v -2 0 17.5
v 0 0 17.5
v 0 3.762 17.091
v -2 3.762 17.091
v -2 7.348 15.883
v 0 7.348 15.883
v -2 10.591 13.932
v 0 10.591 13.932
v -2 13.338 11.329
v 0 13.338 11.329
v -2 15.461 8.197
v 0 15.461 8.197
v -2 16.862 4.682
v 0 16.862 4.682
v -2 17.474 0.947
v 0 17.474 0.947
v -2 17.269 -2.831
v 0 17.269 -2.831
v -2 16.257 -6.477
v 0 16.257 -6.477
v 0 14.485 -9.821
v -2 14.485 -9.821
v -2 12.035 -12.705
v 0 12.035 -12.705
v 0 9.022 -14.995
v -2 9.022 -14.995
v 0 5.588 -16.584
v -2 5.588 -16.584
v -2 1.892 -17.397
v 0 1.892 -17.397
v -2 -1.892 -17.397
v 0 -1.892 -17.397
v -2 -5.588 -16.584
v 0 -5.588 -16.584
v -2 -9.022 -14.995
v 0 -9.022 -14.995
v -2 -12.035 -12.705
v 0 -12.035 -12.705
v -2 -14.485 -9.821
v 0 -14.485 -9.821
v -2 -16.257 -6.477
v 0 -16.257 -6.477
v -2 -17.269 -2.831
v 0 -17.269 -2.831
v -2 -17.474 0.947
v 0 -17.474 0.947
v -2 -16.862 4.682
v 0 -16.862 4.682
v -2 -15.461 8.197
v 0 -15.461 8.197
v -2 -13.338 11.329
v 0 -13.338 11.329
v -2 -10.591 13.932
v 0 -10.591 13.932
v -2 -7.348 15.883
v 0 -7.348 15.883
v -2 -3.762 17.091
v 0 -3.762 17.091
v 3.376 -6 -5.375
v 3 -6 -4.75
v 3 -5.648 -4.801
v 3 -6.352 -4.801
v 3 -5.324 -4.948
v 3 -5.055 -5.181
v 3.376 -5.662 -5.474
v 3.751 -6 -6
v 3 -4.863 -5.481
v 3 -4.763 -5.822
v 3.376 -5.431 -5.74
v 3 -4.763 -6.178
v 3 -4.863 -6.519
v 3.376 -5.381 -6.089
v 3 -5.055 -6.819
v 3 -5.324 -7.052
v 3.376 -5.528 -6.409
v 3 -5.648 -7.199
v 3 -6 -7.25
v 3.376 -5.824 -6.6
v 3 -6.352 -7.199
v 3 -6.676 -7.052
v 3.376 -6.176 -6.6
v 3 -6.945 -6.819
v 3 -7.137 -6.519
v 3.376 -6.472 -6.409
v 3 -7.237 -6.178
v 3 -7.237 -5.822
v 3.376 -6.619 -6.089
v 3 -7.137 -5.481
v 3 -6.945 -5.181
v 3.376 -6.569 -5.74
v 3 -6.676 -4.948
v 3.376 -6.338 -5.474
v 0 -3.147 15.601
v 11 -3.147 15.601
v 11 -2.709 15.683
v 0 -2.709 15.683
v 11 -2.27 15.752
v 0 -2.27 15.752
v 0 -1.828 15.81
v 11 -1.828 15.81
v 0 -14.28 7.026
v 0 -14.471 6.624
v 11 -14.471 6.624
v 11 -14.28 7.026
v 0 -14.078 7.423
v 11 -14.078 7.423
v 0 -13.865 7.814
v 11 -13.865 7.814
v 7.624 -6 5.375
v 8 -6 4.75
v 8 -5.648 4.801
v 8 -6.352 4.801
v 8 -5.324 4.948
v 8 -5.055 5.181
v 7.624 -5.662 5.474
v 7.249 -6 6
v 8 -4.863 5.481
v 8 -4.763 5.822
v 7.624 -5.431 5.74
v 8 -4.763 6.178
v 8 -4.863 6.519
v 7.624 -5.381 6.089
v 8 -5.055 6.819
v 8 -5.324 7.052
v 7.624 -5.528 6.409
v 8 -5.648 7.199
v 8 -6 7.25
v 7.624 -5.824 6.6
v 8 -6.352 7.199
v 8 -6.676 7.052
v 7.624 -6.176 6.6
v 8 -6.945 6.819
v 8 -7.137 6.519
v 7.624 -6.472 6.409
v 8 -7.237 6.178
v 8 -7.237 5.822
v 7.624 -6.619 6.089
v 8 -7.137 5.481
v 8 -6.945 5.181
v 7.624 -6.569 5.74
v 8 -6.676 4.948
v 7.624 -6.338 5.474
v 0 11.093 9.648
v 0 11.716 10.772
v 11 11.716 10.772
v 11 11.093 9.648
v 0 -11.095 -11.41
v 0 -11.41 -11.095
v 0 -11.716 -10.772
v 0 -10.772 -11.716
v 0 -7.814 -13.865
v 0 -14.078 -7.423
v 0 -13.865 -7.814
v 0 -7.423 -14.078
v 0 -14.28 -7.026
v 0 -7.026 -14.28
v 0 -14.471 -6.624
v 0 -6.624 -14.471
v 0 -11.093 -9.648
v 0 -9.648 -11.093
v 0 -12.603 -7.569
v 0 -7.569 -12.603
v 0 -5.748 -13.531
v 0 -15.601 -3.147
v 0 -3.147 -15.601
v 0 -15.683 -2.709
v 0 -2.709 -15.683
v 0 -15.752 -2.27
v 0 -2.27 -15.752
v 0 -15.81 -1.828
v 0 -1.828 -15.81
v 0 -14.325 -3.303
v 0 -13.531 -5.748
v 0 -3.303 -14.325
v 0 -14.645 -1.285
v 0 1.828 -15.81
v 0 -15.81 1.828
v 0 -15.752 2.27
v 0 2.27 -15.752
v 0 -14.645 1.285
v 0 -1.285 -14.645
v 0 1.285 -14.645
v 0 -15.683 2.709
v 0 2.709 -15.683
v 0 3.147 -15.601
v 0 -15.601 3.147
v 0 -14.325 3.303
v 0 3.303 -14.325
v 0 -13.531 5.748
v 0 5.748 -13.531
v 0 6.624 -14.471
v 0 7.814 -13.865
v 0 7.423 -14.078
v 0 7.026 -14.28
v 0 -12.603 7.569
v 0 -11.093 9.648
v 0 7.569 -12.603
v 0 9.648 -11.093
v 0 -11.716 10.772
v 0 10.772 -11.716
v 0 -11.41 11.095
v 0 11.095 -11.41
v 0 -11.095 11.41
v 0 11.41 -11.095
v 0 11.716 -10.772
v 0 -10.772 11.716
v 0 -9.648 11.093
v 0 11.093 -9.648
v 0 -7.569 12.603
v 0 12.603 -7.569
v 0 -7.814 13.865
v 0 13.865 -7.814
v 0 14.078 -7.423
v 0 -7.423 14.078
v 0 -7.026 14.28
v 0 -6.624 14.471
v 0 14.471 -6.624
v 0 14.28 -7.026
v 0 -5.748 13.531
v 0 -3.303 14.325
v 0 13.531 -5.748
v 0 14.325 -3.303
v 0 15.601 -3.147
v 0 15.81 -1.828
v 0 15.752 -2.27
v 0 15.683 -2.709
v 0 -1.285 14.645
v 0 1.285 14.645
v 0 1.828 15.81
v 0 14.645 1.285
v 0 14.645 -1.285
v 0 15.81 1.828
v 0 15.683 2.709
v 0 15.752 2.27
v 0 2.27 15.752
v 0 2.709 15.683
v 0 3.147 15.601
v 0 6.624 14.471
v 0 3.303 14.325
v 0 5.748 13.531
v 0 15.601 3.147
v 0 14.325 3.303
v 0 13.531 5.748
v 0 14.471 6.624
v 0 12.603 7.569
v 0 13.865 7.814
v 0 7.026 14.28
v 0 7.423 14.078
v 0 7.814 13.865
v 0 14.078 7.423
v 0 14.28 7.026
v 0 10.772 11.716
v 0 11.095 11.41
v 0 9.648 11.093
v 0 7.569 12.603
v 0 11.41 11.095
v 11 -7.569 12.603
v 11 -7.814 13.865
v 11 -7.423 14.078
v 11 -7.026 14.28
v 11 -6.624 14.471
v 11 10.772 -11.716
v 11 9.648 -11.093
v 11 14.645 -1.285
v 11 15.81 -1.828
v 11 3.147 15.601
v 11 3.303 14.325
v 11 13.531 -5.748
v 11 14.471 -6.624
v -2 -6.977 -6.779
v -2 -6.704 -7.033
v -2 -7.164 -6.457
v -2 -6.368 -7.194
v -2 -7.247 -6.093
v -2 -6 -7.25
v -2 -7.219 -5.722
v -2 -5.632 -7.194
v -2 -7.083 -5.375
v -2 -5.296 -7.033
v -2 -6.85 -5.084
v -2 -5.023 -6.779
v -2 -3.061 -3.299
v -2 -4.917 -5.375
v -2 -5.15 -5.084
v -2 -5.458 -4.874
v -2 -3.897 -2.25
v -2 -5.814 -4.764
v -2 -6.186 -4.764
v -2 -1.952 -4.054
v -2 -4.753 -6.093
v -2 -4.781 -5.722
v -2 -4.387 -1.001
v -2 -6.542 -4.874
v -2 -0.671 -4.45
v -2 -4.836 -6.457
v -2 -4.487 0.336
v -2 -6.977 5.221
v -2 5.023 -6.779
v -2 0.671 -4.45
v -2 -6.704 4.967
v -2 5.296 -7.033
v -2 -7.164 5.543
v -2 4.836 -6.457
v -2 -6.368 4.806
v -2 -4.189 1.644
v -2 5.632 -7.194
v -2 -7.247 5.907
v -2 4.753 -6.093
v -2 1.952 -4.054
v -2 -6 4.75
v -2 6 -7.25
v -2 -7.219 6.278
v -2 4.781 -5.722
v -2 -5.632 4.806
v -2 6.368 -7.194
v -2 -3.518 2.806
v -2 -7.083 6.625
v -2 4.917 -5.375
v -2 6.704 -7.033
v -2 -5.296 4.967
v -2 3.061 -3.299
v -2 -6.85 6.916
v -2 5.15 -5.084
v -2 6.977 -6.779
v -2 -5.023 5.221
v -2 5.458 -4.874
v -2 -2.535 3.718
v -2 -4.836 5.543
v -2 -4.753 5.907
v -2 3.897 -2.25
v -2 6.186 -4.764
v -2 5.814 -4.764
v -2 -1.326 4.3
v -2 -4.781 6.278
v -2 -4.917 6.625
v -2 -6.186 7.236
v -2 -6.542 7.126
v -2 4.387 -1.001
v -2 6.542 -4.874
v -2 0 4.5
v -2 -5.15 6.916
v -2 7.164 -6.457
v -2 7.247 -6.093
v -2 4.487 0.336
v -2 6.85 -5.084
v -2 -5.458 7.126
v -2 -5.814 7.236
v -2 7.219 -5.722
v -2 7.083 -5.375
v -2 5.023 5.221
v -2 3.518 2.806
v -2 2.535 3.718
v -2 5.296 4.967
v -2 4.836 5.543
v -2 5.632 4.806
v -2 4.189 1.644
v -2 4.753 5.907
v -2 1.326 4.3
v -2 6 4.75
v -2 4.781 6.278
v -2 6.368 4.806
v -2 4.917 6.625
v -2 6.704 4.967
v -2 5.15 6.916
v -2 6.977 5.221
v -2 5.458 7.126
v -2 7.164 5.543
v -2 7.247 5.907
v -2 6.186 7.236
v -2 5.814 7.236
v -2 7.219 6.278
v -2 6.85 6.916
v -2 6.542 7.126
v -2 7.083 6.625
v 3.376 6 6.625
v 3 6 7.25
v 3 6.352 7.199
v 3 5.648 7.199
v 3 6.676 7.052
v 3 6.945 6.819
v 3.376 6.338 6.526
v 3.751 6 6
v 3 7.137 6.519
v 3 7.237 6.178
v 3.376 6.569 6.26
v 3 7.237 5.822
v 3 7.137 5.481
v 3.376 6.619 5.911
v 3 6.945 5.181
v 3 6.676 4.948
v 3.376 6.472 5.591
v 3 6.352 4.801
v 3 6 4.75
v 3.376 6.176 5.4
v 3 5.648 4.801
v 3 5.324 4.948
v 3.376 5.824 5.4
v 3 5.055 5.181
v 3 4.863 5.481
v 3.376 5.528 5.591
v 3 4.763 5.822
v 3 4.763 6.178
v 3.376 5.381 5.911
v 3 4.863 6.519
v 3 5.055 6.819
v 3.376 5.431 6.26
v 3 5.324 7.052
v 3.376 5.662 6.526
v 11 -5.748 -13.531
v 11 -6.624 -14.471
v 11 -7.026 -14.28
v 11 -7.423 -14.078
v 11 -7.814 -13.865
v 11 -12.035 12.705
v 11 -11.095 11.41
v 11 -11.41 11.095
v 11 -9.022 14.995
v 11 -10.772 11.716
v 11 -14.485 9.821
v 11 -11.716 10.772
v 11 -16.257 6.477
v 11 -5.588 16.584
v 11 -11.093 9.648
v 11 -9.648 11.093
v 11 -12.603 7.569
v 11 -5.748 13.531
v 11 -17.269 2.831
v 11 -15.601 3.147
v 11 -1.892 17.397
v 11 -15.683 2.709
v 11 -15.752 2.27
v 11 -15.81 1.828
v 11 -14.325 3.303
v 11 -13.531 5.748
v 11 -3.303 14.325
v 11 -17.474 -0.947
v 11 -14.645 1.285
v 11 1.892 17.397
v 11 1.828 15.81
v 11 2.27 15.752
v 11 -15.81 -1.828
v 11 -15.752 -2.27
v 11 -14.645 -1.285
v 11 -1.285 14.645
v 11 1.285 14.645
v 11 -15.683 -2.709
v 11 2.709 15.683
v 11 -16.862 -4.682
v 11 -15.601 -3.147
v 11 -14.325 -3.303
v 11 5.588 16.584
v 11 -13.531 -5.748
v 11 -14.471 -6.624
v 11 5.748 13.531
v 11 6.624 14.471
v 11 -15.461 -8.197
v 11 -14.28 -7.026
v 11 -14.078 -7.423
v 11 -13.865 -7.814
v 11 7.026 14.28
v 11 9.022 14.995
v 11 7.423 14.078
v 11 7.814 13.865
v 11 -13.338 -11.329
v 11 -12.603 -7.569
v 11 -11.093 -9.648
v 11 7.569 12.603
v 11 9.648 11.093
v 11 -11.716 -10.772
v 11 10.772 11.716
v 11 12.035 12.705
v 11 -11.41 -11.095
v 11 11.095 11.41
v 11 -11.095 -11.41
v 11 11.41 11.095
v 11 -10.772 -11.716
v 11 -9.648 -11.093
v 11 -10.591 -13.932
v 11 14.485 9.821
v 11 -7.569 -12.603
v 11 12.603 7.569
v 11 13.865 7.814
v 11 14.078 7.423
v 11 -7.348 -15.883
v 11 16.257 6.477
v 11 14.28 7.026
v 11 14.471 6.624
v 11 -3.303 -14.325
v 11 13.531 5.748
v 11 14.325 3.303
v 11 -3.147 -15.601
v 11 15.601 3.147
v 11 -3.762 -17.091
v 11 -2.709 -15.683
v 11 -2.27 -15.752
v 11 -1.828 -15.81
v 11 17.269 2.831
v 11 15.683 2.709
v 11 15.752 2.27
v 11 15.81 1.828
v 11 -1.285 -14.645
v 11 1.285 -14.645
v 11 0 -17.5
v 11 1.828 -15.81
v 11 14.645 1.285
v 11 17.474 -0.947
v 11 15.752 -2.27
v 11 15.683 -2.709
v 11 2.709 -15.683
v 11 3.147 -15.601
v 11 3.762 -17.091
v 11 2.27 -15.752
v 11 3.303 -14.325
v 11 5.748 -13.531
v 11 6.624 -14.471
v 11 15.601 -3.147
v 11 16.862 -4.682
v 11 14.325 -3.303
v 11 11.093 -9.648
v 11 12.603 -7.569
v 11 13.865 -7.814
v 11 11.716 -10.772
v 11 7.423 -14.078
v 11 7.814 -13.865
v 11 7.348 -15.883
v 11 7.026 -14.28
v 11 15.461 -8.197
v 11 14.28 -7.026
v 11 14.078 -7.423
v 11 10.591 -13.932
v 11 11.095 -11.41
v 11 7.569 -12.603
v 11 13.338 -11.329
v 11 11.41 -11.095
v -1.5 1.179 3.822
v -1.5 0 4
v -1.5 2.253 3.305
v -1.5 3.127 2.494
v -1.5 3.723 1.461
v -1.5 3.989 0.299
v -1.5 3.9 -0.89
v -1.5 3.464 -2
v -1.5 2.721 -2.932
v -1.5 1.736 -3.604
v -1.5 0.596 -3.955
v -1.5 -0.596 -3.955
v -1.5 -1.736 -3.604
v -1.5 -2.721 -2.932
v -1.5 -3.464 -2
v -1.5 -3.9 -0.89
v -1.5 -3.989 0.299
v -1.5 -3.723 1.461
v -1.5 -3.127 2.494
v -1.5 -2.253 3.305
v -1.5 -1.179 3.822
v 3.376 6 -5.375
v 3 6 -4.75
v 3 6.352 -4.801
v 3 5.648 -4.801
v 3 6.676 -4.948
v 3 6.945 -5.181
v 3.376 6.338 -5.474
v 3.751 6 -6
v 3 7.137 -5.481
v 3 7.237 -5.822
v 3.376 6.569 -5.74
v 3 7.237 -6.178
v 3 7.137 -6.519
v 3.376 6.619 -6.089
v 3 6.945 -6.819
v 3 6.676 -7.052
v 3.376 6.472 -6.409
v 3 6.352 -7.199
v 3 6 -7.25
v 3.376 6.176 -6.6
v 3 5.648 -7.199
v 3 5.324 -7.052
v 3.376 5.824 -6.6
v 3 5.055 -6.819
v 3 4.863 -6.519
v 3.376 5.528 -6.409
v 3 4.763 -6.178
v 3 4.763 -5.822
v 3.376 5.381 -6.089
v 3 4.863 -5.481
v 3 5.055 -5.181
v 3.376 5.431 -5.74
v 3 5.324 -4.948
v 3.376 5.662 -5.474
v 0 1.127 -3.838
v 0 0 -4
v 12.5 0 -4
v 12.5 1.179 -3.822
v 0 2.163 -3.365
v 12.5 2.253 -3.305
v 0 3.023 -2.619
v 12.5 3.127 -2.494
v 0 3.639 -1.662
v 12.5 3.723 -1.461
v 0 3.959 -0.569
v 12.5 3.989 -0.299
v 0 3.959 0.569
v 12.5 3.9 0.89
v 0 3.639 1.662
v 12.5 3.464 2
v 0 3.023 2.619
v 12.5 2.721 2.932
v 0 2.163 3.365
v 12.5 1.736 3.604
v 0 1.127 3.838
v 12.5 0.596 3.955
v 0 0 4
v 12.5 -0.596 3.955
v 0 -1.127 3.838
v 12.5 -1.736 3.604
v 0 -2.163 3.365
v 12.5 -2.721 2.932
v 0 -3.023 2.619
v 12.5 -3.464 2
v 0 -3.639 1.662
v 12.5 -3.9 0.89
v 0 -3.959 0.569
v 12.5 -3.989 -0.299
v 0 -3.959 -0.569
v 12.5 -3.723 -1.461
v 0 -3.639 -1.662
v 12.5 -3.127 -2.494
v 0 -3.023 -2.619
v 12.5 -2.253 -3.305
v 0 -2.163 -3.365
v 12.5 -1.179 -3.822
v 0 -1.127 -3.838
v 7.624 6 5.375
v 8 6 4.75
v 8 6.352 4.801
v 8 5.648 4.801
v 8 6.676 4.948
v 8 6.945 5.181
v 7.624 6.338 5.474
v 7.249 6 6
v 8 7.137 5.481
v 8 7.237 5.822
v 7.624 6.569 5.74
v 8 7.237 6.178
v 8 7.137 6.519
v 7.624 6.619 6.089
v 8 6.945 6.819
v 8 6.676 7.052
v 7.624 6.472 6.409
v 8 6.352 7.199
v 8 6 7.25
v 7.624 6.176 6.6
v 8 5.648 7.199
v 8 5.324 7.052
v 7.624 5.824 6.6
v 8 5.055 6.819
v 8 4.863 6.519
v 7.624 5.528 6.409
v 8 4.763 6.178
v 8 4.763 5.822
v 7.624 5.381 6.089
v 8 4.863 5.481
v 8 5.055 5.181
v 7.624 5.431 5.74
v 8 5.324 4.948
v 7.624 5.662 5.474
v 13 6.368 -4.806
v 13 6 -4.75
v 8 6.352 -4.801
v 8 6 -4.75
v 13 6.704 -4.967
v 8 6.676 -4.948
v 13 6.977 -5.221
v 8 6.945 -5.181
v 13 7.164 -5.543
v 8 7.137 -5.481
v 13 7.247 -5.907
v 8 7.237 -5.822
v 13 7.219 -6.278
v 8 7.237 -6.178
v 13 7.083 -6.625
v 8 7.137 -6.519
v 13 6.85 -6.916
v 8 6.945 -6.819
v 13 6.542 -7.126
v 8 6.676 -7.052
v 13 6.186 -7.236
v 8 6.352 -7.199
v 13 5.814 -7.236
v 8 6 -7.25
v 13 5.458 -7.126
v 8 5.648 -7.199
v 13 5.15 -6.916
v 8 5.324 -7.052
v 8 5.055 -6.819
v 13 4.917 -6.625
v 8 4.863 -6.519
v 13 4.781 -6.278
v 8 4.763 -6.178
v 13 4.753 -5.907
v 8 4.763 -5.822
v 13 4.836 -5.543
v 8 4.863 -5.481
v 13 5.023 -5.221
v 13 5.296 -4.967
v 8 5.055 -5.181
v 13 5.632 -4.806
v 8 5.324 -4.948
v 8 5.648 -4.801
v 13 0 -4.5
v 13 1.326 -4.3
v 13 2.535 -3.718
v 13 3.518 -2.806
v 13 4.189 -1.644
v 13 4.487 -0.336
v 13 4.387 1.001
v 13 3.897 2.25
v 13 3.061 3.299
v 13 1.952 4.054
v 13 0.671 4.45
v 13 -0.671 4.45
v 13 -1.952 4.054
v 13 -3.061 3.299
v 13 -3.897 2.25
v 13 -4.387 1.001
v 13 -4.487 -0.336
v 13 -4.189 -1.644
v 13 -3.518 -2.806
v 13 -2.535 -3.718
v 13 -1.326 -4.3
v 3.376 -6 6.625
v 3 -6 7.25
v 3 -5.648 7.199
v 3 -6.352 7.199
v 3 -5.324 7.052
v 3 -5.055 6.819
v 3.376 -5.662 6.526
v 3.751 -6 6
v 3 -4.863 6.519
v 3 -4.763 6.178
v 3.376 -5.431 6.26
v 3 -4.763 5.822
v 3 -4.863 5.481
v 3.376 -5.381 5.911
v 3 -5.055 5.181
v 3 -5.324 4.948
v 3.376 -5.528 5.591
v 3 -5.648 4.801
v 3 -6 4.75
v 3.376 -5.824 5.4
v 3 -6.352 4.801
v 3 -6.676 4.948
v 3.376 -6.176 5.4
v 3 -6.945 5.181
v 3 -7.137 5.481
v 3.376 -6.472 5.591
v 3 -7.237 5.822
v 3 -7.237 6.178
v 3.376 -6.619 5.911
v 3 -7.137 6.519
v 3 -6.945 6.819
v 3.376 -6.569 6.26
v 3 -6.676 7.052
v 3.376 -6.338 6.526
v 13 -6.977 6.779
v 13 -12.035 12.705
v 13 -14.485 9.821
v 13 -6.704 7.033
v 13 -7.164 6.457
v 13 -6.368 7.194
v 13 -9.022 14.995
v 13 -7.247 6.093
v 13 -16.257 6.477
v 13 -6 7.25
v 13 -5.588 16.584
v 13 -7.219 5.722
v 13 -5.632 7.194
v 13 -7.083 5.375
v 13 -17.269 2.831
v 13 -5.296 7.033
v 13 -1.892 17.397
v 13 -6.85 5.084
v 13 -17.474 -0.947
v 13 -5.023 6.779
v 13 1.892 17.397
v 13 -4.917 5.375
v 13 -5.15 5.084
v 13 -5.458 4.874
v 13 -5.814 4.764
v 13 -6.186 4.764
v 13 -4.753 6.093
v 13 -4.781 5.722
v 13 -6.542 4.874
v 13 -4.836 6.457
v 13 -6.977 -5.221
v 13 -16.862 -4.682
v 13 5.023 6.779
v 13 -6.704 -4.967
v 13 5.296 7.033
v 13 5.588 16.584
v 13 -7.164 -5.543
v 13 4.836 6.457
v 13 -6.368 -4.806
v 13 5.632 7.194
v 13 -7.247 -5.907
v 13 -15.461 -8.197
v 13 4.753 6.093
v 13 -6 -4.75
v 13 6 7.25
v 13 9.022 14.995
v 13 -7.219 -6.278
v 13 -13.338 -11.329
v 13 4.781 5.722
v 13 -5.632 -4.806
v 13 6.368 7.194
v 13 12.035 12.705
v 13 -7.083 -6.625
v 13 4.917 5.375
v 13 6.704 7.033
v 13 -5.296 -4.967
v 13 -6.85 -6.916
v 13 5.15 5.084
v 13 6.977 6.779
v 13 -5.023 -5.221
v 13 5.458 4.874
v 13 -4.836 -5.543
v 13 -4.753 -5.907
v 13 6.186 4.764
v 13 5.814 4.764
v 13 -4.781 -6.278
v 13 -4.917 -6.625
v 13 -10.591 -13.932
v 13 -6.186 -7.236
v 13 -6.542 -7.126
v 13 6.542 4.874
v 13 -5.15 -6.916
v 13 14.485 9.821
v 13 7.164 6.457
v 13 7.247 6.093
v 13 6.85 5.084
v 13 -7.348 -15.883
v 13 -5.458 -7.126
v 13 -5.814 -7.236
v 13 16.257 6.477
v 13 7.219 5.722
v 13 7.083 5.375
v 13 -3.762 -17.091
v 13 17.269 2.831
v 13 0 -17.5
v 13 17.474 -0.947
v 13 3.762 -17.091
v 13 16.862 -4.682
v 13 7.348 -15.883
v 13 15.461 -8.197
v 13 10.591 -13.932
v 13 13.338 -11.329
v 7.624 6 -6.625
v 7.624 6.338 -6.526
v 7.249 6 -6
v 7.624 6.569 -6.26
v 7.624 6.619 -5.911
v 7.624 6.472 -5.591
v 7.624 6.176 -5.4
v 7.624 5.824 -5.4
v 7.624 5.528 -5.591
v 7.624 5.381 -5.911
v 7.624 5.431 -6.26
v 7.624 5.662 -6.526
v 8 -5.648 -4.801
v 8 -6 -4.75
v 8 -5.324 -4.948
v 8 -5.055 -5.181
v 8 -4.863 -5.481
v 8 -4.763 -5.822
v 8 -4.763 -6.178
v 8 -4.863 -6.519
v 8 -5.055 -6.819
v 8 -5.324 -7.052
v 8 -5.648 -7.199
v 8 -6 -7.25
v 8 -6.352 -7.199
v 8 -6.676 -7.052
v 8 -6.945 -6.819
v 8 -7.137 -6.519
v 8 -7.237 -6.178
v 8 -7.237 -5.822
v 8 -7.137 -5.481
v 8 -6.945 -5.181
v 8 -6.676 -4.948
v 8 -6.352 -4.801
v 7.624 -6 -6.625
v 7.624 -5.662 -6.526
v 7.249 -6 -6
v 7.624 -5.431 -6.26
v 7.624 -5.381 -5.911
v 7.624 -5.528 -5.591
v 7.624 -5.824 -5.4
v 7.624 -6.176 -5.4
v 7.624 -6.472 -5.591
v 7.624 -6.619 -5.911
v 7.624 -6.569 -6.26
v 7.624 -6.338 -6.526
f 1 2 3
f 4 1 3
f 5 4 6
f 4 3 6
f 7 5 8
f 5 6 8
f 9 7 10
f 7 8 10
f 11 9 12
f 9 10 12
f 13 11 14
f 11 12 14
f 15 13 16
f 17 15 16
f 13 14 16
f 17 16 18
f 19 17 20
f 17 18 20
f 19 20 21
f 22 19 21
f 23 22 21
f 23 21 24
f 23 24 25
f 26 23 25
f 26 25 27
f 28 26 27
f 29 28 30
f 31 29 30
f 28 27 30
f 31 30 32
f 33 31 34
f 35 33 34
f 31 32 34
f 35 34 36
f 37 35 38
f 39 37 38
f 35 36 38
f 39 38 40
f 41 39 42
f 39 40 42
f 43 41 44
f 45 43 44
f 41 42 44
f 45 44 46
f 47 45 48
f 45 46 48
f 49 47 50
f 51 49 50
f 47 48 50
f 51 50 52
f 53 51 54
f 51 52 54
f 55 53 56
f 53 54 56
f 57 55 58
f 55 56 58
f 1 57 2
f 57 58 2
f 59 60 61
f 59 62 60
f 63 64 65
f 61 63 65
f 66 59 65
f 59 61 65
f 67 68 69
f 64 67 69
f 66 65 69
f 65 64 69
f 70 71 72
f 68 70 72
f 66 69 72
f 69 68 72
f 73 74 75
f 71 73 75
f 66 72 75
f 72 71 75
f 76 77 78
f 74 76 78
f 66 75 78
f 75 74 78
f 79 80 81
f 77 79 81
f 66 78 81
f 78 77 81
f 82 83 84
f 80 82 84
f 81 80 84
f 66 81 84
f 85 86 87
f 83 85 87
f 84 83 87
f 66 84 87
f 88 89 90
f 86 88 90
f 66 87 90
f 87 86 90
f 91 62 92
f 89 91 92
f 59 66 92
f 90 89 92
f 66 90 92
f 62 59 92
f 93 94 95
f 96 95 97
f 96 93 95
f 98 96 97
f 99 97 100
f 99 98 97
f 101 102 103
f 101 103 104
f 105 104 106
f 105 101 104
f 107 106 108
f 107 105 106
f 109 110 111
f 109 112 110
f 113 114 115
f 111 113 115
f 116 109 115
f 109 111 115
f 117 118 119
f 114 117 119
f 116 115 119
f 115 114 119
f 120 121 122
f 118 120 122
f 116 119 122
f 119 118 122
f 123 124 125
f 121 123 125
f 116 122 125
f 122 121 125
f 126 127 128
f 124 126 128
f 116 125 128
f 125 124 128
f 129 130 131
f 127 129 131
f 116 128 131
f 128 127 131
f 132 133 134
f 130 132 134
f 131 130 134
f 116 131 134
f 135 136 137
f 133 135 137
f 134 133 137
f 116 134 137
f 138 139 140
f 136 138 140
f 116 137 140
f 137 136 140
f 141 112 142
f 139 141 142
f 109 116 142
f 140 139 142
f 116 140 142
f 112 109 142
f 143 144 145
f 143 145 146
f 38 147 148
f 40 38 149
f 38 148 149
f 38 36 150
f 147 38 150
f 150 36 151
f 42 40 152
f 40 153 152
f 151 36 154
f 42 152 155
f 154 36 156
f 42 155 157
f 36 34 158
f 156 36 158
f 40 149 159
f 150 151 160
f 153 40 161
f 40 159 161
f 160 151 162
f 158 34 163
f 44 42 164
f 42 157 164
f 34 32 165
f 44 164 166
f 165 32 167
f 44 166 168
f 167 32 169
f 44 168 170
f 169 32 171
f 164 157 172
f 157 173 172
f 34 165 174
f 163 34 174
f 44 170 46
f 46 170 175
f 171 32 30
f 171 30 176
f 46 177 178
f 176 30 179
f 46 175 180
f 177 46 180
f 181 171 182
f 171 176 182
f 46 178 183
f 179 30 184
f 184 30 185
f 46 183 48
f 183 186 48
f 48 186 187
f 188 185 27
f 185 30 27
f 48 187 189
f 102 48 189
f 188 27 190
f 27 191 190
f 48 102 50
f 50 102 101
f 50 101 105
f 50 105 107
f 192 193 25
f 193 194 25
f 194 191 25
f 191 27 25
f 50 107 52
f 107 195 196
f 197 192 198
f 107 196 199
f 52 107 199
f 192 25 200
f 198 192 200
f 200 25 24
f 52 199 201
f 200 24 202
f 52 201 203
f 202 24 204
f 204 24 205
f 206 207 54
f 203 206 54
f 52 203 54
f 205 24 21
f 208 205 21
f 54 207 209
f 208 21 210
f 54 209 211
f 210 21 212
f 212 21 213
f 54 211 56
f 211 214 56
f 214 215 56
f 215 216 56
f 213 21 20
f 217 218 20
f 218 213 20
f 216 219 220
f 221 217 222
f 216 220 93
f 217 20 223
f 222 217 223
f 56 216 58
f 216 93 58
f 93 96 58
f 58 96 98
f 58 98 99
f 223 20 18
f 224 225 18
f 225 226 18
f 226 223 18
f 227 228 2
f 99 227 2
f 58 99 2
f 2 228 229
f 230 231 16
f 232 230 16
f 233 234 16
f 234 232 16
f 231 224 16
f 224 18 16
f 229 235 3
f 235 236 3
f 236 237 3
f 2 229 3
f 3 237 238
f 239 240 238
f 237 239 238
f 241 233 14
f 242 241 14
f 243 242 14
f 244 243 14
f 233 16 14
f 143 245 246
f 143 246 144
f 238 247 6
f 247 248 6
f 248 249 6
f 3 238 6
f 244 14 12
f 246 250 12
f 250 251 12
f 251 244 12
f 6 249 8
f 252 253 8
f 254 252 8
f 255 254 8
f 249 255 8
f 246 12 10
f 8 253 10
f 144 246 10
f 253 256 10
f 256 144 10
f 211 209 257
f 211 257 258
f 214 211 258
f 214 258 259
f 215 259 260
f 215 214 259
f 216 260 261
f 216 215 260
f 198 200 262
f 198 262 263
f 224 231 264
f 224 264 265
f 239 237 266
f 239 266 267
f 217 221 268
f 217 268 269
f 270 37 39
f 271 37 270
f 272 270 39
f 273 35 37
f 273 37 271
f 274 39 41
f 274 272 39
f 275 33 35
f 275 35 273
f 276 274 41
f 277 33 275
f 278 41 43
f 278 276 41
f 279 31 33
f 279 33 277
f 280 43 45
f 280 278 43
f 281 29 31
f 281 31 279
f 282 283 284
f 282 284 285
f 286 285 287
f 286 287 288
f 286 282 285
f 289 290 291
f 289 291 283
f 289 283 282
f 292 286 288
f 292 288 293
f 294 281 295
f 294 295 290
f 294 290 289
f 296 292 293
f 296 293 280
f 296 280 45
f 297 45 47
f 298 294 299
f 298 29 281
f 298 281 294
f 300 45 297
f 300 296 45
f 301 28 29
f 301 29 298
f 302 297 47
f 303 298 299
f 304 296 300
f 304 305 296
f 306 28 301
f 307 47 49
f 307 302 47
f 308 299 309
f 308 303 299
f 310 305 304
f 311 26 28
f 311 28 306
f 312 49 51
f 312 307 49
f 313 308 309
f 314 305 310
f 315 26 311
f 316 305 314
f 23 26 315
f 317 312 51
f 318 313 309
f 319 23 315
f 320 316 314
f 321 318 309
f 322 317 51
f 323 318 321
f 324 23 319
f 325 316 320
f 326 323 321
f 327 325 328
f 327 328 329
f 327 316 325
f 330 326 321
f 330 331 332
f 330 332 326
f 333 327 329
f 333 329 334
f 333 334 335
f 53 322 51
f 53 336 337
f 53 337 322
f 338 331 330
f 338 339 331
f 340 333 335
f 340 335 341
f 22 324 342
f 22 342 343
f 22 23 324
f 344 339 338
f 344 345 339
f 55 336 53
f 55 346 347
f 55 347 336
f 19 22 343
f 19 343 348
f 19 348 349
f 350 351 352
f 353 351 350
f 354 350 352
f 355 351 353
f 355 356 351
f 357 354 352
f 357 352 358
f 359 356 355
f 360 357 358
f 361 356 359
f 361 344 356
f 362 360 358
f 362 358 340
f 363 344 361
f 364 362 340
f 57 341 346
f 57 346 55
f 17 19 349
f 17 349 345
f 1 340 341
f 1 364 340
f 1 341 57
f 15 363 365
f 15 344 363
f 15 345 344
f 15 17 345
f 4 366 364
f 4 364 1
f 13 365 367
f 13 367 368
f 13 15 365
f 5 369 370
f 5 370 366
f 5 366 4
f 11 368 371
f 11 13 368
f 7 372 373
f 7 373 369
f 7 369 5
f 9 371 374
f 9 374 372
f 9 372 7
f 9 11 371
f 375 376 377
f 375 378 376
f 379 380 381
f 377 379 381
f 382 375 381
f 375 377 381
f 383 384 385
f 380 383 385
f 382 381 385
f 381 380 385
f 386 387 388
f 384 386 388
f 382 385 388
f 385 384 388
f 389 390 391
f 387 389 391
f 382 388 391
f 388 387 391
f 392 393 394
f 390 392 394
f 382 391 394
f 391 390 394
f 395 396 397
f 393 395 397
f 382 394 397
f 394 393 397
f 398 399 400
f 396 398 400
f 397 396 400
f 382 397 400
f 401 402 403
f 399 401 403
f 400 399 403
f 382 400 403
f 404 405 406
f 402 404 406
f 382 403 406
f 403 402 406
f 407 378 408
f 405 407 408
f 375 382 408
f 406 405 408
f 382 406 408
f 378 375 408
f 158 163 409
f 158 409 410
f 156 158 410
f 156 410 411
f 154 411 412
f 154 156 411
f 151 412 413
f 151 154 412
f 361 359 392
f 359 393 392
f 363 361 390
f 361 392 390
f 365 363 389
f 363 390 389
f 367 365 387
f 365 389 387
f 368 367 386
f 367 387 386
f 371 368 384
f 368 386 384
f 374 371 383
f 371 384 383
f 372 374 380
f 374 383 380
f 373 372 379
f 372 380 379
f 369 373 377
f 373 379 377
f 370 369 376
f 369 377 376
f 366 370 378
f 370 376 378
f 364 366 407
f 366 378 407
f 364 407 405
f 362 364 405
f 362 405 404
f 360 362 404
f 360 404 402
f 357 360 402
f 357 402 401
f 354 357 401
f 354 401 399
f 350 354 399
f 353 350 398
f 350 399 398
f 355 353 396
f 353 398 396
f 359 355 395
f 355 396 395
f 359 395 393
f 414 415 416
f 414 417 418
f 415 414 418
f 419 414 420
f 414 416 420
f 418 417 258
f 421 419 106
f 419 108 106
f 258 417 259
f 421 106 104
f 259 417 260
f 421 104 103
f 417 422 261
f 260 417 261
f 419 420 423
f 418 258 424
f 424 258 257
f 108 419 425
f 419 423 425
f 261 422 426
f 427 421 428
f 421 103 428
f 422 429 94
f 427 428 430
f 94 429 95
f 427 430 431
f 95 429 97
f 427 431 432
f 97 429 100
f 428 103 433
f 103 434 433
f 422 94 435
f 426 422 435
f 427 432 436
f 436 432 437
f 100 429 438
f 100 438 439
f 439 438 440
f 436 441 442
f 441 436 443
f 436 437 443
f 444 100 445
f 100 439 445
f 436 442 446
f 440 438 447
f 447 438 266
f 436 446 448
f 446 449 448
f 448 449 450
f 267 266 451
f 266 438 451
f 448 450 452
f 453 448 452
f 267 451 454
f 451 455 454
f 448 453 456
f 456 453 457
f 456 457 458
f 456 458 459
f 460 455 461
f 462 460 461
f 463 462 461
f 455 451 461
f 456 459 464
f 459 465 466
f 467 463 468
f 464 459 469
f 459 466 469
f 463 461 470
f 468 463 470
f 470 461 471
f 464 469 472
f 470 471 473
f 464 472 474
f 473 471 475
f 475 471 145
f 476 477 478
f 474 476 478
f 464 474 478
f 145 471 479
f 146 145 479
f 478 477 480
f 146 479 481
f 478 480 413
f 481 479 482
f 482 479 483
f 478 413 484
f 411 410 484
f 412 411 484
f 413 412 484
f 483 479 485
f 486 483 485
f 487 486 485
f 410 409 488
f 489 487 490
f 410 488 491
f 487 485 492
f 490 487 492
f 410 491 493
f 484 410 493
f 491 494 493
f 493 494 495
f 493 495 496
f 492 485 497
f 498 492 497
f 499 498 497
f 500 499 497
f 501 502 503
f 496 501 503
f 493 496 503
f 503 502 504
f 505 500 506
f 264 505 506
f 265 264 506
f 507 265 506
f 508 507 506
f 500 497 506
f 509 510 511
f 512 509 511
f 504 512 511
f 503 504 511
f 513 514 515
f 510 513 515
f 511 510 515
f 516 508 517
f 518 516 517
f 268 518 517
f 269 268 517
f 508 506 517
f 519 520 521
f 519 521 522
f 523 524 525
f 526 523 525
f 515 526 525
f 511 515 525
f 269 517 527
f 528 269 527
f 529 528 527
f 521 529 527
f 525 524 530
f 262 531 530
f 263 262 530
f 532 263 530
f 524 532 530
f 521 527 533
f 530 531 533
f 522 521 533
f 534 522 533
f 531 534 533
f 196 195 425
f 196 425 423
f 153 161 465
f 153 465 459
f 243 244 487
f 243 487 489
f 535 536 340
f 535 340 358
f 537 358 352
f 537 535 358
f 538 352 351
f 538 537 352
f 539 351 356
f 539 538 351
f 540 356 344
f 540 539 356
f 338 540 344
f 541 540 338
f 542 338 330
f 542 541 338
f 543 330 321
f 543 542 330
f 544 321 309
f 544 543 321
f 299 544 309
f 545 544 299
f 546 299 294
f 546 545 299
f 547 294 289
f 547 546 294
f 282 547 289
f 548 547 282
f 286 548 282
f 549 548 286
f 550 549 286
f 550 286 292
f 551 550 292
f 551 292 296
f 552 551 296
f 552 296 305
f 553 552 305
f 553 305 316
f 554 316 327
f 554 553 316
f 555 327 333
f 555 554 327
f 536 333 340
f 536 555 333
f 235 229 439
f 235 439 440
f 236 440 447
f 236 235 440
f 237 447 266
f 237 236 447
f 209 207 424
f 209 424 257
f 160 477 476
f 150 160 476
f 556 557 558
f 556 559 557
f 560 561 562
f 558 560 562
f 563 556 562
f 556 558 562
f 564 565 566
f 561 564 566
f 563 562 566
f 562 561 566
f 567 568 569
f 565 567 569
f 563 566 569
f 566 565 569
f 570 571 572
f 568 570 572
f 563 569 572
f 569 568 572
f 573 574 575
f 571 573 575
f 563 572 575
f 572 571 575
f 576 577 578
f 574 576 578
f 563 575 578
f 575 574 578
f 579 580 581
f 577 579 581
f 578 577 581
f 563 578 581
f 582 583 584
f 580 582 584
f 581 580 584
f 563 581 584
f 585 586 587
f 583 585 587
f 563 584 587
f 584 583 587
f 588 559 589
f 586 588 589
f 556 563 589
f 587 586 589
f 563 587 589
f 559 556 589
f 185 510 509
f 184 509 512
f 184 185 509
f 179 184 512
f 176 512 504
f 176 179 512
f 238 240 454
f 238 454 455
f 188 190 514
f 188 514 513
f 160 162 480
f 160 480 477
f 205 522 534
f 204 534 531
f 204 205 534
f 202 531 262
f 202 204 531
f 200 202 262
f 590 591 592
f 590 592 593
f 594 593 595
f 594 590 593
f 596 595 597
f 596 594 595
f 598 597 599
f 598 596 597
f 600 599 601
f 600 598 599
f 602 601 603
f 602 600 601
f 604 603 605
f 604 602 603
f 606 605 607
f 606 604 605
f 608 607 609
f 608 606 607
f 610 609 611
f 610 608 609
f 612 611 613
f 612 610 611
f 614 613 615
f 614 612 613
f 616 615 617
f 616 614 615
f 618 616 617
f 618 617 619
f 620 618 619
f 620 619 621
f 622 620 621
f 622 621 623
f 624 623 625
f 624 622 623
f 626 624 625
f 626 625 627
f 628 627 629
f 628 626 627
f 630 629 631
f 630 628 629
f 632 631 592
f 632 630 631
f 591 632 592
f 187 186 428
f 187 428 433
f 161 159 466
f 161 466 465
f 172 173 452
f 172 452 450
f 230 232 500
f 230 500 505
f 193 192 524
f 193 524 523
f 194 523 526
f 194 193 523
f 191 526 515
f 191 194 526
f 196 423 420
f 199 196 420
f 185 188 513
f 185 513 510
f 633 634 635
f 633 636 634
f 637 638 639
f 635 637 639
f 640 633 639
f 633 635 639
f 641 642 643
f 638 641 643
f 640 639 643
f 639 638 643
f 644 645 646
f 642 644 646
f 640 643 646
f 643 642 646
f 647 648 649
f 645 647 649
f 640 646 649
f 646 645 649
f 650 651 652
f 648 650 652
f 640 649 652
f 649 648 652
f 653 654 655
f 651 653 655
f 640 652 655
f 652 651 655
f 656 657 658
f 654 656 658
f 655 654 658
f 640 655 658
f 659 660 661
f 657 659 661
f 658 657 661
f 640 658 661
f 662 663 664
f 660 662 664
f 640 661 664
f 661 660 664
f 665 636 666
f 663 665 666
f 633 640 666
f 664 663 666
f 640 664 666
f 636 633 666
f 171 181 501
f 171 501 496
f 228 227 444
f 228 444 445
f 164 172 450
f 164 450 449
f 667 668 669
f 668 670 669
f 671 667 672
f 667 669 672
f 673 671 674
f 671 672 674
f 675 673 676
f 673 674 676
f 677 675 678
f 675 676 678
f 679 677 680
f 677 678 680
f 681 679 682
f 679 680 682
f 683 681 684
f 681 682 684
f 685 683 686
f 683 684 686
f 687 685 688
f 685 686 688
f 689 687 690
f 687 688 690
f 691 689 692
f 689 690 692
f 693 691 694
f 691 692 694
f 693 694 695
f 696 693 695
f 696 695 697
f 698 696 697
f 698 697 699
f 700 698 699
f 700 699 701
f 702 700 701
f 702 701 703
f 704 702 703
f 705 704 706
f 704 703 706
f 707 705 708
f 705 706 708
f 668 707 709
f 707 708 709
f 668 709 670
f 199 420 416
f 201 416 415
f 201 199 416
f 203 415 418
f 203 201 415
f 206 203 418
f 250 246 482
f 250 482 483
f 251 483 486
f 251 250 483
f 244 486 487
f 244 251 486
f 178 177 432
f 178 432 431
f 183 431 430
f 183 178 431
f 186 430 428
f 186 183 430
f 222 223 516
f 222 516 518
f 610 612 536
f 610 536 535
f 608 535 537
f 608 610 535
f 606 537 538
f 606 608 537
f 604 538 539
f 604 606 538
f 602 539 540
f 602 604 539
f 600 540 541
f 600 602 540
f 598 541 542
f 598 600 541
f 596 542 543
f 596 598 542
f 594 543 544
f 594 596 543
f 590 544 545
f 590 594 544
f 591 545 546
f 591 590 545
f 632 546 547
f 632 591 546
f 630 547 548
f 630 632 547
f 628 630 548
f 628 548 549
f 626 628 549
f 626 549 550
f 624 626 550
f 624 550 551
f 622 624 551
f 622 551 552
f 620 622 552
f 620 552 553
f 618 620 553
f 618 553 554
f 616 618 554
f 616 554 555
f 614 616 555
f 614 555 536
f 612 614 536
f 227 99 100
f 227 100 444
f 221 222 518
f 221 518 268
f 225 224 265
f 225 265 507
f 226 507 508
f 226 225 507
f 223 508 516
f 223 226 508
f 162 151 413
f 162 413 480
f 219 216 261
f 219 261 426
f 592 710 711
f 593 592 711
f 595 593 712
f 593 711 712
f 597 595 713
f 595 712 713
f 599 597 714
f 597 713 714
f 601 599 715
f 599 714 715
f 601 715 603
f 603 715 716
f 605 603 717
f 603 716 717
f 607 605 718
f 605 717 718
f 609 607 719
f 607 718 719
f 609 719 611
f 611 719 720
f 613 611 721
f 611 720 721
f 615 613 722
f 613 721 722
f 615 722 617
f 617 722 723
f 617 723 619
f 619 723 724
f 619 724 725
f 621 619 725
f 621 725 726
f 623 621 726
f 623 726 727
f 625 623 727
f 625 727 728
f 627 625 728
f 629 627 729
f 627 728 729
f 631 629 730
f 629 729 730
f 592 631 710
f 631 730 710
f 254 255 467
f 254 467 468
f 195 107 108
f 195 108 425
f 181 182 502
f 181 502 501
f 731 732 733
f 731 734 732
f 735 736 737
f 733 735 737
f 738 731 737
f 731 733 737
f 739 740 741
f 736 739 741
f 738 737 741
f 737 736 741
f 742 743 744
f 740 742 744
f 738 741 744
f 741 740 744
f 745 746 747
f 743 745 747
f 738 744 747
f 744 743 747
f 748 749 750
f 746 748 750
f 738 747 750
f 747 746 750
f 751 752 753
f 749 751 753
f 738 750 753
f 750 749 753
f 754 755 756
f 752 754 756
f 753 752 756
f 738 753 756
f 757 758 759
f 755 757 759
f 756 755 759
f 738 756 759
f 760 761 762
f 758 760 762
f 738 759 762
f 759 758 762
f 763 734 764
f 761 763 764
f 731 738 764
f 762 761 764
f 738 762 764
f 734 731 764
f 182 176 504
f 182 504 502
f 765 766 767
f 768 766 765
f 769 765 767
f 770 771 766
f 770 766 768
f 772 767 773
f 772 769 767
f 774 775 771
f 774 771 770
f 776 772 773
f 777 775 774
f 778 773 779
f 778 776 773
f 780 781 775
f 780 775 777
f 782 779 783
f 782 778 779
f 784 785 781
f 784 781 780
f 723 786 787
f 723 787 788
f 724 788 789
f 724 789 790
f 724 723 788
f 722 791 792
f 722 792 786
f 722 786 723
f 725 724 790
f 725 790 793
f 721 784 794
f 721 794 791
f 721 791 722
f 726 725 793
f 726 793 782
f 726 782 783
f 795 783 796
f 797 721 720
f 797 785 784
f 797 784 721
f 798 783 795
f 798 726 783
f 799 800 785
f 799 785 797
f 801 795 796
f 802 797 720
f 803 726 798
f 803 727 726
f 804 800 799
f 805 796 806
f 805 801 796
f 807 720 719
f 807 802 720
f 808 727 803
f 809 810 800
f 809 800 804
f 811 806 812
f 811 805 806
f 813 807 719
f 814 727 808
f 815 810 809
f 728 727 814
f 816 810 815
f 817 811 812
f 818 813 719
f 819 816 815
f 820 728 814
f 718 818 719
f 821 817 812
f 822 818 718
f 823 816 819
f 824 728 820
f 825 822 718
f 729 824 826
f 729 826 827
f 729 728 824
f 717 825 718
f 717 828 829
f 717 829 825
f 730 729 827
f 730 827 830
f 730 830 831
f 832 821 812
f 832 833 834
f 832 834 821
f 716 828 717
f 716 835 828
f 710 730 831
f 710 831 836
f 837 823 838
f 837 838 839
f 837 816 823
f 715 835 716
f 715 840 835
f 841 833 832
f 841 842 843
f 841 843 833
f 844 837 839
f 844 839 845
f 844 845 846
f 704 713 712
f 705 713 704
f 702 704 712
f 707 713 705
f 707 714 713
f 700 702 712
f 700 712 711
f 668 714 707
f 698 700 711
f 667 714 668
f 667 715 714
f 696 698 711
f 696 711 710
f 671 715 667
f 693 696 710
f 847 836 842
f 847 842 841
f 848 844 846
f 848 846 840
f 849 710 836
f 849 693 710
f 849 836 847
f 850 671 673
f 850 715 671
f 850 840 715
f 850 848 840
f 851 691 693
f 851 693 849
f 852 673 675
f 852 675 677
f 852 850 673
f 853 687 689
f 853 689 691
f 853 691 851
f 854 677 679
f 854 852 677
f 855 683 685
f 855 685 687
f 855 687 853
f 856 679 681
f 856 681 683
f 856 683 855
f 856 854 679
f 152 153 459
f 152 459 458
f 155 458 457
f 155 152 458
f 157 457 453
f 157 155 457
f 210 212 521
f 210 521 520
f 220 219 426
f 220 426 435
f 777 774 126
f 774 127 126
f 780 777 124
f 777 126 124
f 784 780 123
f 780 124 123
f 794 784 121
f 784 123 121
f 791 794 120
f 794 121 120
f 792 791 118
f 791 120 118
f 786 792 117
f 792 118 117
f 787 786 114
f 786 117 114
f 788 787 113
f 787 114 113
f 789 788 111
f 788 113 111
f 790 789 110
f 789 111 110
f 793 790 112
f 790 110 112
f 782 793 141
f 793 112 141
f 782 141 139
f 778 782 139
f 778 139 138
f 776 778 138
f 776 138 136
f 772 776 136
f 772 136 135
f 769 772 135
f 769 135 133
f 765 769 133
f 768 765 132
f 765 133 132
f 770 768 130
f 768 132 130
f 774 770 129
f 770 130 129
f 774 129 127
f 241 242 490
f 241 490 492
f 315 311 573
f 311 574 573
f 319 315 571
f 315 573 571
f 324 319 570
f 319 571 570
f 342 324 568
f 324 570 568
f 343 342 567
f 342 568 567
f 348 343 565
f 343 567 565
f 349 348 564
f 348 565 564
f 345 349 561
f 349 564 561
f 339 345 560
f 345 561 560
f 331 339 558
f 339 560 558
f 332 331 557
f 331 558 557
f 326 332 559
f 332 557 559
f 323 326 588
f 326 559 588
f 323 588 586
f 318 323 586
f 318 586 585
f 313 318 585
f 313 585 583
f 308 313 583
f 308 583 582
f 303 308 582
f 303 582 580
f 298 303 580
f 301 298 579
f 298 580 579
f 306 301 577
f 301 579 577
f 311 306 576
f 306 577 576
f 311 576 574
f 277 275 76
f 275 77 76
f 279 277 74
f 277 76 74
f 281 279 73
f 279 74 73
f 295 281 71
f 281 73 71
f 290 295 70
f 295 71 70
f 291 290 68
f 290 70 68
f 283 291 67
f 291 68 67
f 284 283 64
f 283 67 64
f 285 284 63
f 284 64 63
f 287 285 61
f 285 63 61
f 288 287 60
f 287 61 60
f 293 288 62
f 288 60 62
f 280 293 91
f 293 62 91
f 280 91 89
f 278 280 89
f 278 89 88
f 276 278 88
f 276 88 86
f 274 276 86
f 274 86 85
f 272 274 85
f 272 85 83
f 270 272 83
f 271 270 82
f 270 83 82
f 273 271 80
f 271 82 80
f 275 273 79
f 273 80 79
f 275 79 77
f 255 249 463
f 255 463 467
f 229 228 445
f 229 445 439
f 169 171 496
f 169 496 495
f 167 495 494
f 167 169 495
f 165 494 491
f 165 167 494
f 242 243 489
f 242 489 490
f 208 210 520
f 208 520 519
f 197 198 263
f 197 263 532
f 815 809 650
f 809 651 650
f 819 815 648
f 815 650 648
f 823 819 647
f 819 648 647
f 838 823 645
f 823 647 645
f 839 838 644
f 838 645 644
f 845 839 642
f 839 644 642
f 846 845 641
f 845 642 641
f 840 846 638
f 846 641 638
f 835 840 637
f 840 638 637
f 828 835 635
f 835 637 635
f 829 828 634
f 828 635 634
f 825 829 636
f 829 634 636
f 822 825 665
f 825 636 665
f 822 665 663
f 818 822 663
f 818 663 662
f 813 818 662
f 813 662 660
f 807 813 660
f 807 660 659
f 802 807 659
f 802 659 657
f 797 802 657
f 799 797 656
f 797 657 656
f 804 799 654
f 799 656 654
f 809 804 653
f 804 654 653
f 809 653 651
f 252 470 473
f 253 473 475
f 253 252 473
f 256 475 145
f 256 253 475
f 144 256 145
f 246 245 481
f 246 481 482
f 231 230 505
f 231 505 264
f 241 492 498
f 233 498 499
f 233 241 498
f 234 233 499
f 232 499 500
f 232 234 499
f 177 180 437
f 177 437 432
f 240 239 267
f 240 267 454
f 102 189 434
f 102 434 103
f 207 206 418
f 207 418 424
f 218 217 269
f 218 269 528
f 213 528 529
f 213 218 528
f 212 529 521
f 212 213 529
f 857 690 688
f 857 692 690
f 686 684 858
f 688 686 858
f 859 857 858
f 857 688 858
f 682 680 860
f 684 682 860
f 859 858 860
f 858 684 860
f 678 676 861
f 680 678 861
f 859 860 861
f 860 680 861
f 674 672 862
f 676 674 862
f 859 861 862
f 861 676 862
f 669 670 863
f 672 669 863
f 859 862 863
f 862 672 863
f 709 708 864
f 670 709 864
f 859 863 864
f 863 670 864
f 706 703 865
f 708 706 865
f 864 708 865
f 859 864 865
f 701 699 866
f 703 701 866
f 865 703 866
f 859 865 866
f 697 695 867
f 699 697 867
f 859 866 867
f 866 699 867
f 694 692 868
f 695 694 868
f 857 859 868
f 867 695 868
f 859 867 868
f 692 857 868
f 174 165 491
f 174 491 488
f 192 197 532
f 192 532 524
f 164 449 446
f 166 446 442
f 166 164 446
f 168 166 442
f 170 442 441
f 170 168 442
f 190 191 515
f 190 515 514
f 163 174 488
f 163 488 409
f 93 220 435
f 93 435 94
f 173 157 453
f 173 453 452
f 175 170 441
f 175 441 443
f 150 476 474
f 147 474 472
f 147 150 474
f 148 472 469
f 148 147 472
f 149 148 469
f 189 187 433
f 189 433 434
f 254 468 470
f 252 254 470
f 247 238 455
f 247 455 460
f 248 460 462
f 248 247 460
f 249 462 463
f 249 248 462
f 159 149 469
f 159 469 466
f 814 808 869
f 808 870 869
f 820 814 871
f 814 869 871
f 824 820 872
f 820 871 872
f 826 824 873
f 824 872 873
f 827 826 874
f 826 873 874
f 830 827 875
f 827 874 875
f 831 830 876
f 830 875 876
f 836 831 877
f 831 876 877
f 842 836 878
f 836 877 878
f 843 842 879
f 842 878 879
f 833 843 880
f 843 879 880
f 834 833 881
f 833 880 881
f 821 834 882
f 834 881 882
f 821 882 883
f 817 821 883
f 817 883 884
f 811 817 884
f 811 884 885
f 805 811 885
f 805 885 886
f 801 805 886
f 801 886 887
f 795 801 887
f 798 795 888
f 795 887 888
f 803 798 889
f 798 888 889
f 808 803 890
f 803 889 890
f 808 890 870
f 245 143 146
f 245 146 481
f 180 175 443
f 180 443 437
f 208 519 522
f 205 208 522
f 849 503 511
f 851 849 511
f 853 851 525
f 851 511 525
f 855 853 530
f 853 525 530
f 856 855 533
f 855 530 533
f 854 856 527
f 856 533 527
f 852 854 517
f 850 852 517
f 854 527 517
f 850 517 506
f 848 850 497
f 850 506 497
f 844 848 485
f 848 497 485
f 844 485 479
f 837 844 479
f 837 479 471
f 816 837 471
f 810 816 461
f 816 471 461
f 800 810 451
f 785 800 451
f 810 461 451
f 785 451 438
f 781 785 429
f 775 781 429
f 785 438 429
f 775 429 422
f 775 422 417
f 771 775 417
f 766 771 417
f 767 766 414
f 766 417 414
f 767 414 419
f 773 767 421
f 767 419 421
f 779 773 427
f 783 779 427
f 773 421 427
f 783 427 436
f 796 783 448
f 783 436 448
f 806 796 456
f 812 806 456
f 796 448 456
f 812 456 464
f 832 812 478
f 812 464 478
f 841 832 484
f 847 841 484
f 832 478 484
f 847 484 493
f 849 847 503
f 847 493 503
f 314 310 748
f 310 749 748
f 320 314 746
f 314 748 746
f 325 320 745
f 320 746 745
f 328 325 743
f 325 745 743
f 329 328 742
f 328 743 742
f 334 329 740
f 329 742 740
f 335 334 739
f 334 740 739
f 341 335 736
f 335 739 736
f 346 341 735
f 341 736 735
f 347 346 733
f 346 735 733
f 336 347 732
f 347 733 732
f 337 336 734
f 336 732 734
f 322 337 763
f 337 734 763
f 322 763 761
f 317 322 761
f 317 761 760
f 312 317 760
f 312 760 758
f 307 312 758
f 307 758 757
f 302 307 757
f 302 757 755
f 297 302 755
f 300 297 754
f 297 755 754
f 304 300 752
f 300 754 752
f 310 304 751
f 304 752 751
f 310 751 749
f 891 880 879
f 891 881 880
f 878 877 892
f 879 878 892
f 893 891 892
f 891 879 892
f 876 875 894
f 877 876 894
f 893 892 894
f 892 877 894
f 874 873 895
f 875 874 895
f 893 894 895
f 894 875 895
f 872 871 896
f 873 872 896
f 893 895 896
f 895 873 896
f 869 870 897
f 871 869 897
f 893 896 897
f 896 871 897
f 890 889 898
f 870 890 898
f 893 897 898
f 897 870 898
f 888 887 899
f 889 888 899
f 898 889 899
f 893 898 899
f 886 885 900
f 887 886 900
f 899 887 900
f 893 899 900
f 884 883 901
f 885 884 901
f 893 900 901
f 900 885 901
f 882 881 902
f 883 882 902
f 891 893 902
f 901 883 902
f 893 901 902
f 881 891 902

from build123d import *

# Parameters (mm, degrees)
SKETCH_1_R             = 4
EXTRUDE_1_DEPTH        = 11
SKETCH_2_R             = 17.5
SKETCH_2_R_2           = 4
EXTRUDE_2_DEPTH        = 2
SKETCH_3_R             = 17.5
SKETCH_3_R_2           = 4
EXTRUDE_3_DEPTH        = 2
CHAMFER_1_SIZE         = 0.5
HOLE_WIZARD_M3_1_D     = 2.5
HOLE_WIZARD_M3_1_DEPTH = 5
HOLE_WIZARD_M3_1_TIP   = 0.751075774
HOLE_WIZARD_M3_2_D     = 2.5
HOLE_WIZARD_M3_2_DEPTH = 5
HOLE_WIZARD_M3_2_TIP   = 0.751075774


with BuildPart() as part:
    # 草图1 → 凸台-拉伸1 (new body)
    with BuildSketch(Plane(origin=(0, 0, 0), x_dir=(0, 0, -1), z_dir=(1, 0, 0))):
        with BuildLine():
            Line((-1.285, 14.645), (1.285, 14.645))
            Line((1.285, 14.645), (1.828089361, 15.809658892))
            ThreePointArc((1.828089361, 15.809658892), (2.489654511, 15.719059941), (3.146836974, 15.60078979))
            Line((3.146836974, 15.60078979), (3.303446259, 14.325309519))
            Line((3.303446259, 14.325309519), (5.747661506, 13.531135843))
            Line((5.747661506, 13.531135843), (6.624069572, 14.47096843))
            ThreePointArc((6.624069572, 14.47096843), (7.225258803, 14.180368832), (7.813728981, 13.864806685))
            Line((7.813728981, 13.864806685), (7.568528182, 12.603357932))
            Line((7.568528182, 12.603357932), (9.647701858, 11.092749833))
            Line((9.647701858, 11.092749833), (10.771639701, 11.715758753))
            ThreePointArc((10.771639701, 11.715758753), (11.253604423, 11.253604423), (11.715758753, 10.771639701))
            Line((11.715758753, 10.771639701), (11.092749833, 9.647701858))
            Line((11.092749833, 9.647701858), (12.603357932, 7.568528182))
            Line((12.603357932, 7.568528182), (13.864806685, 7.813728981))
            ThreePointArc((13.864806685, 7.813728981), (14.180368832, 7.225258803), (14.47096843, 6.624069572))
            Line((14.47096843, 6.624069572), (13.531135843, 5.747661506))
            Line((13.531135843, 5.747661506), (14.325309519, 3.303446259))
            Line((14.325309519, 3.303446259), (15.60078979, 3.146836974))
            ThreePointArc((15.60078979, 3.146836974), (15.719059941, 2.489654511), (15.809658892, 1.828089361))
            Line((15.809658892, 1.828089361), (14.645, 1.285))
            Line((14.645, 1.285), (14.645, -1.285))
            Line((14.645, -1.285), (15.809658892, -1.828089361))
            ThreePointArc((15.809658892, -1.828089361), (15.719059941, -2.489654511), (15.60078979, -3.146836974))
            Line((15.60078979, -3.146836974), (14.325309519, -3.303446259))
            Line((14.325309519, -3.303446259), (13.531135843, -5.747661506))
            Line((13.531135843, -5.747661506), (14.47096843, -6.624069572))
            ThreePointArc((14.47096843, -6.624069572), (14.180368832, -7.225258803), (13.864806685, -7.813728981))
            Line((13.864806685, -7.813728981), (12.603357932, -7.568528182))
            Line((12.603357932, -7.568528182), (11.092749833, -9.647701858))
            Line((11.092749833, -9.647701858), (11.715758753, -10.771639701))
            ThreePointArc((11.715758753, -10.771639701), (11.253604423, -11.253604423), (10.771639701, -11.715758753))
            Line((10.771639701, -11.715758753), (9.647701858, -11.092749833))
            Line((9.647701858, -11.092749833), (7.568528182, -12.603357932))
            Line((7.568528182, -12.603357932), (7.813728981, -13.864806685))
            ThreePointArc((7.813728981, -13.864806685), (7.225258803, -14.180368832), (6.624069572, -14.47096843))
            Line((6.624069572, -14.47096843), (5.747661506, -13.531135843))
            Line((5.747661506, -13.531135843), (3.303446259, -14.325309519))
            Line((3.303446259, -14.325309519), (3.146836974, -15.60078979))
            ThreePointArc((3.146836974, -15.60078979), (2.489654511, -15.719059941), (1.828089361, -15.809658892))
            Line((1.828089361, -15.809658892), (1.285, -14.645))
            Line((1.285, -14.645), (-1.285, -14.645))
            Line((-1.285, -14.645), (-1.828089361, -15.809658892))
            ThreePointArc((-1.828089361, -15.809658892), (-2.489654511, -15.719059941), (-3.146836974, -15.60078979))
            Line((-3.146836974, -15.60078979), (-3.303446259, -14.325309519))
            Line((-3.303446259, -14.325309519), (-5.747661506, -13.531135843))
            Line((-5.747661506, -13.531135843), (-6.624069572, -14.47096843))
            ThreePointArc((-6.624069572, -14.47096843), (-7.225258803, -14.180368832), (-7.813728981, -13.864806685))
            Line((-7.813728981, -13.864806685), (-7.568528182, -12.603357932))
            Line((-7.568528182, -12.603357932), (-9.647701858, -11.092749833))
            Line((-9.647701858, -11.092749833), (-10.771639701, -11.715758753))
            ThreePointArc((-10.771639701, -11.715758753), (-11.253604423, -11.253604423), (-11.715758753, -10.771639701))
            Line((-11.715758753, -10.771639701), (-11.092749833, -9.647701858))
            Line((-11.092749833, -9.647701858), (-12.603357932, -7.568528182))
            Line((-12.603357932, -7.568528182), (-13.864806685, -7.813728981))
            ThreePointArc((-13.864806685, -7.813728981), (-14.180368832, -7.225258803), (-14.47096843, -6.624069572))
            Line((-14.47096843, -6.624069572), (-13.531135843, -5.747661506))
            Line((-13.531135843, -5.747661506), (-14.325309519, -3.303446259))
            Line((-14.325309519, -3.303446259), (-15.60078979, -3.146836974))
            ThreePointArc((-15.60078979, -3.146836974), (-15.719059941, -2.489654511), (-15.809658892, -1.828089361))
            Line((-15.809658892, -1.828089361), (-14.645, -1.285))
            Line((-14.645, -1.285), (-14.645, 1.285))
            Line((-14.645, 1.285), (-15.809658892, 1.828089361))
            ThreePointArc((-15.809658892, 1.828089361), (-15.719059941, 2.489654511), (-15.60078979, 3.146836974))
            Line((-15.60078979, 3.146836974), (-14.325309519, 3.303446259))
            Line((-14.325309519, 3.303446259), (-13.531135843, 5.747661506))
            Line((-13.531135843, 5.747661506), (-14.47096843, 6.624069572))
            ThreePointArc((-14.47096843, 6.624069572), (-14.180368832, 7.225258803), (-13.864806685, 7.813728981))
            Line((-13.864806685, 7.813728981), (-12.603357932, 7.568528182))
            Line((-12.603357932, 7.568528182), (-11.092749833, 9.647701858))
            Line((-11.092749833, 9.647701858), (-11.715758753, 10.771639701))
            ThreePointArc((-11.715758753, 10.771639701), (-11.253604423, 11.253604423), (-10.771639701, 11.715758753))
            Line((-10.771639701, 11.715758753), (-9.647701858, 11.092749833))
            Line((-9.647701858, 11.092749833), (-7.568528182, 12.603357932))
            Line((-7.568528182, 12.603357932), (-7.813728981, 13.864806685))
            ThreePointArc((-7.813728981, 13.864806685), (-7.225258803, 14.180368832), (-6.624069572, 14.47096843))
            Line((-6.624069572, 14.47096843), (-5.747661506, 13.531135843))
            Line((-5.747661506, 13.531135843), (-3.303446259, 14.325309519))
            Line((-3.303446259, 14.325309519), (-3.146836974, 15.60078979))
            ThreePointArc((-3.146836974, 15.60078979), (-2.489654511, 15.719059941), (-1.828089361, 15.809658892))
            Line((-1.828089361, 15.809658892), (-1.285, 14.645))
        make_face()
        Circle(SKETCH_1_R, mode=Mode.SUBTRACT)
    extrude(amount=EXTRUDE_1_DEPTH)

    # 草图2 → 凸台-拉伸2 (add)
    with BuildSketch(Plane(origin=(11, 0, 0), x_dir=(0, 0, -1), z_dir=(1, 0, 0))):
        Circle(SKETCH_2_R)
        Circle(SKETCH_2_R_2, mode=Mode.SUBTRACT)
    extrude(amount=EXTRUDE_2_DEPTH)

    # 草图3 → 凸台-拉伸3 (add)
    with BuildSketch(Plane.ZY):
        Circle(SKETCH_3_R)
        Circle(SKETCH_3_R_2, mode=Mode.SUBTRACT)
    extrude(amount=EXTRUDE_3_DEPTH)

    # 倒角1
    chamfer_1_edges = [part.edges().sort_by_distance(p)[0] for p in [
        (13, 0, 4),
        (-2, 0, -4),
    ]]
    chamfer(chamfer_1_edges, length=CHAMFER_1_SIZE)

    # M3 螺纹孔1
    with Locations(Plane(origin=(13, 0, 0), x_dir=(0, 0, -1), z_dir=(1, 0, 0))):
        with Locations((-6, 6), (6, 6), (6, -6), (-6, -6)):
            Hole(HOLE_WIZARD_M3_1_D / 2, depth=HOLE_WIZARD_M3_1_DEPTH)
            with Locations((0, 0, -(HOLE_WIZARD_M3_1_DEPTH + HOLE_WIZARD_M3_1_TIP / 2))):  # 118° drill point
                Cone(0, HOLE_WIZARD_M3_1_D / 2, HOLE_WIZARD_M3_1_TIP, mode=Mode.SUBTRACT)

    # M3 螺纹孔2
    with Locations(Plane.ZY.offset(2)):
        with Locations((-6, 6), (6, 6), (6, -6), (-6, -6)):
            Hole(HOLE_WIZARD_M3_2_D / 2, depth=HOLE_WIZARD_M3_2_DEPTH)
            with Locations((0, 0, -(HOLE_WIZARD_M3_2_DEPTH + HOLE_WIZARD_M3_2_TIP / 2))):  # 118° drill point
                Cone(0, HOLE_WIZARD_M3_2_D / 2, HOLE_WIZARD_M3_2_TIP, mode=Mode.SUBTRACT)


solid = part.part
